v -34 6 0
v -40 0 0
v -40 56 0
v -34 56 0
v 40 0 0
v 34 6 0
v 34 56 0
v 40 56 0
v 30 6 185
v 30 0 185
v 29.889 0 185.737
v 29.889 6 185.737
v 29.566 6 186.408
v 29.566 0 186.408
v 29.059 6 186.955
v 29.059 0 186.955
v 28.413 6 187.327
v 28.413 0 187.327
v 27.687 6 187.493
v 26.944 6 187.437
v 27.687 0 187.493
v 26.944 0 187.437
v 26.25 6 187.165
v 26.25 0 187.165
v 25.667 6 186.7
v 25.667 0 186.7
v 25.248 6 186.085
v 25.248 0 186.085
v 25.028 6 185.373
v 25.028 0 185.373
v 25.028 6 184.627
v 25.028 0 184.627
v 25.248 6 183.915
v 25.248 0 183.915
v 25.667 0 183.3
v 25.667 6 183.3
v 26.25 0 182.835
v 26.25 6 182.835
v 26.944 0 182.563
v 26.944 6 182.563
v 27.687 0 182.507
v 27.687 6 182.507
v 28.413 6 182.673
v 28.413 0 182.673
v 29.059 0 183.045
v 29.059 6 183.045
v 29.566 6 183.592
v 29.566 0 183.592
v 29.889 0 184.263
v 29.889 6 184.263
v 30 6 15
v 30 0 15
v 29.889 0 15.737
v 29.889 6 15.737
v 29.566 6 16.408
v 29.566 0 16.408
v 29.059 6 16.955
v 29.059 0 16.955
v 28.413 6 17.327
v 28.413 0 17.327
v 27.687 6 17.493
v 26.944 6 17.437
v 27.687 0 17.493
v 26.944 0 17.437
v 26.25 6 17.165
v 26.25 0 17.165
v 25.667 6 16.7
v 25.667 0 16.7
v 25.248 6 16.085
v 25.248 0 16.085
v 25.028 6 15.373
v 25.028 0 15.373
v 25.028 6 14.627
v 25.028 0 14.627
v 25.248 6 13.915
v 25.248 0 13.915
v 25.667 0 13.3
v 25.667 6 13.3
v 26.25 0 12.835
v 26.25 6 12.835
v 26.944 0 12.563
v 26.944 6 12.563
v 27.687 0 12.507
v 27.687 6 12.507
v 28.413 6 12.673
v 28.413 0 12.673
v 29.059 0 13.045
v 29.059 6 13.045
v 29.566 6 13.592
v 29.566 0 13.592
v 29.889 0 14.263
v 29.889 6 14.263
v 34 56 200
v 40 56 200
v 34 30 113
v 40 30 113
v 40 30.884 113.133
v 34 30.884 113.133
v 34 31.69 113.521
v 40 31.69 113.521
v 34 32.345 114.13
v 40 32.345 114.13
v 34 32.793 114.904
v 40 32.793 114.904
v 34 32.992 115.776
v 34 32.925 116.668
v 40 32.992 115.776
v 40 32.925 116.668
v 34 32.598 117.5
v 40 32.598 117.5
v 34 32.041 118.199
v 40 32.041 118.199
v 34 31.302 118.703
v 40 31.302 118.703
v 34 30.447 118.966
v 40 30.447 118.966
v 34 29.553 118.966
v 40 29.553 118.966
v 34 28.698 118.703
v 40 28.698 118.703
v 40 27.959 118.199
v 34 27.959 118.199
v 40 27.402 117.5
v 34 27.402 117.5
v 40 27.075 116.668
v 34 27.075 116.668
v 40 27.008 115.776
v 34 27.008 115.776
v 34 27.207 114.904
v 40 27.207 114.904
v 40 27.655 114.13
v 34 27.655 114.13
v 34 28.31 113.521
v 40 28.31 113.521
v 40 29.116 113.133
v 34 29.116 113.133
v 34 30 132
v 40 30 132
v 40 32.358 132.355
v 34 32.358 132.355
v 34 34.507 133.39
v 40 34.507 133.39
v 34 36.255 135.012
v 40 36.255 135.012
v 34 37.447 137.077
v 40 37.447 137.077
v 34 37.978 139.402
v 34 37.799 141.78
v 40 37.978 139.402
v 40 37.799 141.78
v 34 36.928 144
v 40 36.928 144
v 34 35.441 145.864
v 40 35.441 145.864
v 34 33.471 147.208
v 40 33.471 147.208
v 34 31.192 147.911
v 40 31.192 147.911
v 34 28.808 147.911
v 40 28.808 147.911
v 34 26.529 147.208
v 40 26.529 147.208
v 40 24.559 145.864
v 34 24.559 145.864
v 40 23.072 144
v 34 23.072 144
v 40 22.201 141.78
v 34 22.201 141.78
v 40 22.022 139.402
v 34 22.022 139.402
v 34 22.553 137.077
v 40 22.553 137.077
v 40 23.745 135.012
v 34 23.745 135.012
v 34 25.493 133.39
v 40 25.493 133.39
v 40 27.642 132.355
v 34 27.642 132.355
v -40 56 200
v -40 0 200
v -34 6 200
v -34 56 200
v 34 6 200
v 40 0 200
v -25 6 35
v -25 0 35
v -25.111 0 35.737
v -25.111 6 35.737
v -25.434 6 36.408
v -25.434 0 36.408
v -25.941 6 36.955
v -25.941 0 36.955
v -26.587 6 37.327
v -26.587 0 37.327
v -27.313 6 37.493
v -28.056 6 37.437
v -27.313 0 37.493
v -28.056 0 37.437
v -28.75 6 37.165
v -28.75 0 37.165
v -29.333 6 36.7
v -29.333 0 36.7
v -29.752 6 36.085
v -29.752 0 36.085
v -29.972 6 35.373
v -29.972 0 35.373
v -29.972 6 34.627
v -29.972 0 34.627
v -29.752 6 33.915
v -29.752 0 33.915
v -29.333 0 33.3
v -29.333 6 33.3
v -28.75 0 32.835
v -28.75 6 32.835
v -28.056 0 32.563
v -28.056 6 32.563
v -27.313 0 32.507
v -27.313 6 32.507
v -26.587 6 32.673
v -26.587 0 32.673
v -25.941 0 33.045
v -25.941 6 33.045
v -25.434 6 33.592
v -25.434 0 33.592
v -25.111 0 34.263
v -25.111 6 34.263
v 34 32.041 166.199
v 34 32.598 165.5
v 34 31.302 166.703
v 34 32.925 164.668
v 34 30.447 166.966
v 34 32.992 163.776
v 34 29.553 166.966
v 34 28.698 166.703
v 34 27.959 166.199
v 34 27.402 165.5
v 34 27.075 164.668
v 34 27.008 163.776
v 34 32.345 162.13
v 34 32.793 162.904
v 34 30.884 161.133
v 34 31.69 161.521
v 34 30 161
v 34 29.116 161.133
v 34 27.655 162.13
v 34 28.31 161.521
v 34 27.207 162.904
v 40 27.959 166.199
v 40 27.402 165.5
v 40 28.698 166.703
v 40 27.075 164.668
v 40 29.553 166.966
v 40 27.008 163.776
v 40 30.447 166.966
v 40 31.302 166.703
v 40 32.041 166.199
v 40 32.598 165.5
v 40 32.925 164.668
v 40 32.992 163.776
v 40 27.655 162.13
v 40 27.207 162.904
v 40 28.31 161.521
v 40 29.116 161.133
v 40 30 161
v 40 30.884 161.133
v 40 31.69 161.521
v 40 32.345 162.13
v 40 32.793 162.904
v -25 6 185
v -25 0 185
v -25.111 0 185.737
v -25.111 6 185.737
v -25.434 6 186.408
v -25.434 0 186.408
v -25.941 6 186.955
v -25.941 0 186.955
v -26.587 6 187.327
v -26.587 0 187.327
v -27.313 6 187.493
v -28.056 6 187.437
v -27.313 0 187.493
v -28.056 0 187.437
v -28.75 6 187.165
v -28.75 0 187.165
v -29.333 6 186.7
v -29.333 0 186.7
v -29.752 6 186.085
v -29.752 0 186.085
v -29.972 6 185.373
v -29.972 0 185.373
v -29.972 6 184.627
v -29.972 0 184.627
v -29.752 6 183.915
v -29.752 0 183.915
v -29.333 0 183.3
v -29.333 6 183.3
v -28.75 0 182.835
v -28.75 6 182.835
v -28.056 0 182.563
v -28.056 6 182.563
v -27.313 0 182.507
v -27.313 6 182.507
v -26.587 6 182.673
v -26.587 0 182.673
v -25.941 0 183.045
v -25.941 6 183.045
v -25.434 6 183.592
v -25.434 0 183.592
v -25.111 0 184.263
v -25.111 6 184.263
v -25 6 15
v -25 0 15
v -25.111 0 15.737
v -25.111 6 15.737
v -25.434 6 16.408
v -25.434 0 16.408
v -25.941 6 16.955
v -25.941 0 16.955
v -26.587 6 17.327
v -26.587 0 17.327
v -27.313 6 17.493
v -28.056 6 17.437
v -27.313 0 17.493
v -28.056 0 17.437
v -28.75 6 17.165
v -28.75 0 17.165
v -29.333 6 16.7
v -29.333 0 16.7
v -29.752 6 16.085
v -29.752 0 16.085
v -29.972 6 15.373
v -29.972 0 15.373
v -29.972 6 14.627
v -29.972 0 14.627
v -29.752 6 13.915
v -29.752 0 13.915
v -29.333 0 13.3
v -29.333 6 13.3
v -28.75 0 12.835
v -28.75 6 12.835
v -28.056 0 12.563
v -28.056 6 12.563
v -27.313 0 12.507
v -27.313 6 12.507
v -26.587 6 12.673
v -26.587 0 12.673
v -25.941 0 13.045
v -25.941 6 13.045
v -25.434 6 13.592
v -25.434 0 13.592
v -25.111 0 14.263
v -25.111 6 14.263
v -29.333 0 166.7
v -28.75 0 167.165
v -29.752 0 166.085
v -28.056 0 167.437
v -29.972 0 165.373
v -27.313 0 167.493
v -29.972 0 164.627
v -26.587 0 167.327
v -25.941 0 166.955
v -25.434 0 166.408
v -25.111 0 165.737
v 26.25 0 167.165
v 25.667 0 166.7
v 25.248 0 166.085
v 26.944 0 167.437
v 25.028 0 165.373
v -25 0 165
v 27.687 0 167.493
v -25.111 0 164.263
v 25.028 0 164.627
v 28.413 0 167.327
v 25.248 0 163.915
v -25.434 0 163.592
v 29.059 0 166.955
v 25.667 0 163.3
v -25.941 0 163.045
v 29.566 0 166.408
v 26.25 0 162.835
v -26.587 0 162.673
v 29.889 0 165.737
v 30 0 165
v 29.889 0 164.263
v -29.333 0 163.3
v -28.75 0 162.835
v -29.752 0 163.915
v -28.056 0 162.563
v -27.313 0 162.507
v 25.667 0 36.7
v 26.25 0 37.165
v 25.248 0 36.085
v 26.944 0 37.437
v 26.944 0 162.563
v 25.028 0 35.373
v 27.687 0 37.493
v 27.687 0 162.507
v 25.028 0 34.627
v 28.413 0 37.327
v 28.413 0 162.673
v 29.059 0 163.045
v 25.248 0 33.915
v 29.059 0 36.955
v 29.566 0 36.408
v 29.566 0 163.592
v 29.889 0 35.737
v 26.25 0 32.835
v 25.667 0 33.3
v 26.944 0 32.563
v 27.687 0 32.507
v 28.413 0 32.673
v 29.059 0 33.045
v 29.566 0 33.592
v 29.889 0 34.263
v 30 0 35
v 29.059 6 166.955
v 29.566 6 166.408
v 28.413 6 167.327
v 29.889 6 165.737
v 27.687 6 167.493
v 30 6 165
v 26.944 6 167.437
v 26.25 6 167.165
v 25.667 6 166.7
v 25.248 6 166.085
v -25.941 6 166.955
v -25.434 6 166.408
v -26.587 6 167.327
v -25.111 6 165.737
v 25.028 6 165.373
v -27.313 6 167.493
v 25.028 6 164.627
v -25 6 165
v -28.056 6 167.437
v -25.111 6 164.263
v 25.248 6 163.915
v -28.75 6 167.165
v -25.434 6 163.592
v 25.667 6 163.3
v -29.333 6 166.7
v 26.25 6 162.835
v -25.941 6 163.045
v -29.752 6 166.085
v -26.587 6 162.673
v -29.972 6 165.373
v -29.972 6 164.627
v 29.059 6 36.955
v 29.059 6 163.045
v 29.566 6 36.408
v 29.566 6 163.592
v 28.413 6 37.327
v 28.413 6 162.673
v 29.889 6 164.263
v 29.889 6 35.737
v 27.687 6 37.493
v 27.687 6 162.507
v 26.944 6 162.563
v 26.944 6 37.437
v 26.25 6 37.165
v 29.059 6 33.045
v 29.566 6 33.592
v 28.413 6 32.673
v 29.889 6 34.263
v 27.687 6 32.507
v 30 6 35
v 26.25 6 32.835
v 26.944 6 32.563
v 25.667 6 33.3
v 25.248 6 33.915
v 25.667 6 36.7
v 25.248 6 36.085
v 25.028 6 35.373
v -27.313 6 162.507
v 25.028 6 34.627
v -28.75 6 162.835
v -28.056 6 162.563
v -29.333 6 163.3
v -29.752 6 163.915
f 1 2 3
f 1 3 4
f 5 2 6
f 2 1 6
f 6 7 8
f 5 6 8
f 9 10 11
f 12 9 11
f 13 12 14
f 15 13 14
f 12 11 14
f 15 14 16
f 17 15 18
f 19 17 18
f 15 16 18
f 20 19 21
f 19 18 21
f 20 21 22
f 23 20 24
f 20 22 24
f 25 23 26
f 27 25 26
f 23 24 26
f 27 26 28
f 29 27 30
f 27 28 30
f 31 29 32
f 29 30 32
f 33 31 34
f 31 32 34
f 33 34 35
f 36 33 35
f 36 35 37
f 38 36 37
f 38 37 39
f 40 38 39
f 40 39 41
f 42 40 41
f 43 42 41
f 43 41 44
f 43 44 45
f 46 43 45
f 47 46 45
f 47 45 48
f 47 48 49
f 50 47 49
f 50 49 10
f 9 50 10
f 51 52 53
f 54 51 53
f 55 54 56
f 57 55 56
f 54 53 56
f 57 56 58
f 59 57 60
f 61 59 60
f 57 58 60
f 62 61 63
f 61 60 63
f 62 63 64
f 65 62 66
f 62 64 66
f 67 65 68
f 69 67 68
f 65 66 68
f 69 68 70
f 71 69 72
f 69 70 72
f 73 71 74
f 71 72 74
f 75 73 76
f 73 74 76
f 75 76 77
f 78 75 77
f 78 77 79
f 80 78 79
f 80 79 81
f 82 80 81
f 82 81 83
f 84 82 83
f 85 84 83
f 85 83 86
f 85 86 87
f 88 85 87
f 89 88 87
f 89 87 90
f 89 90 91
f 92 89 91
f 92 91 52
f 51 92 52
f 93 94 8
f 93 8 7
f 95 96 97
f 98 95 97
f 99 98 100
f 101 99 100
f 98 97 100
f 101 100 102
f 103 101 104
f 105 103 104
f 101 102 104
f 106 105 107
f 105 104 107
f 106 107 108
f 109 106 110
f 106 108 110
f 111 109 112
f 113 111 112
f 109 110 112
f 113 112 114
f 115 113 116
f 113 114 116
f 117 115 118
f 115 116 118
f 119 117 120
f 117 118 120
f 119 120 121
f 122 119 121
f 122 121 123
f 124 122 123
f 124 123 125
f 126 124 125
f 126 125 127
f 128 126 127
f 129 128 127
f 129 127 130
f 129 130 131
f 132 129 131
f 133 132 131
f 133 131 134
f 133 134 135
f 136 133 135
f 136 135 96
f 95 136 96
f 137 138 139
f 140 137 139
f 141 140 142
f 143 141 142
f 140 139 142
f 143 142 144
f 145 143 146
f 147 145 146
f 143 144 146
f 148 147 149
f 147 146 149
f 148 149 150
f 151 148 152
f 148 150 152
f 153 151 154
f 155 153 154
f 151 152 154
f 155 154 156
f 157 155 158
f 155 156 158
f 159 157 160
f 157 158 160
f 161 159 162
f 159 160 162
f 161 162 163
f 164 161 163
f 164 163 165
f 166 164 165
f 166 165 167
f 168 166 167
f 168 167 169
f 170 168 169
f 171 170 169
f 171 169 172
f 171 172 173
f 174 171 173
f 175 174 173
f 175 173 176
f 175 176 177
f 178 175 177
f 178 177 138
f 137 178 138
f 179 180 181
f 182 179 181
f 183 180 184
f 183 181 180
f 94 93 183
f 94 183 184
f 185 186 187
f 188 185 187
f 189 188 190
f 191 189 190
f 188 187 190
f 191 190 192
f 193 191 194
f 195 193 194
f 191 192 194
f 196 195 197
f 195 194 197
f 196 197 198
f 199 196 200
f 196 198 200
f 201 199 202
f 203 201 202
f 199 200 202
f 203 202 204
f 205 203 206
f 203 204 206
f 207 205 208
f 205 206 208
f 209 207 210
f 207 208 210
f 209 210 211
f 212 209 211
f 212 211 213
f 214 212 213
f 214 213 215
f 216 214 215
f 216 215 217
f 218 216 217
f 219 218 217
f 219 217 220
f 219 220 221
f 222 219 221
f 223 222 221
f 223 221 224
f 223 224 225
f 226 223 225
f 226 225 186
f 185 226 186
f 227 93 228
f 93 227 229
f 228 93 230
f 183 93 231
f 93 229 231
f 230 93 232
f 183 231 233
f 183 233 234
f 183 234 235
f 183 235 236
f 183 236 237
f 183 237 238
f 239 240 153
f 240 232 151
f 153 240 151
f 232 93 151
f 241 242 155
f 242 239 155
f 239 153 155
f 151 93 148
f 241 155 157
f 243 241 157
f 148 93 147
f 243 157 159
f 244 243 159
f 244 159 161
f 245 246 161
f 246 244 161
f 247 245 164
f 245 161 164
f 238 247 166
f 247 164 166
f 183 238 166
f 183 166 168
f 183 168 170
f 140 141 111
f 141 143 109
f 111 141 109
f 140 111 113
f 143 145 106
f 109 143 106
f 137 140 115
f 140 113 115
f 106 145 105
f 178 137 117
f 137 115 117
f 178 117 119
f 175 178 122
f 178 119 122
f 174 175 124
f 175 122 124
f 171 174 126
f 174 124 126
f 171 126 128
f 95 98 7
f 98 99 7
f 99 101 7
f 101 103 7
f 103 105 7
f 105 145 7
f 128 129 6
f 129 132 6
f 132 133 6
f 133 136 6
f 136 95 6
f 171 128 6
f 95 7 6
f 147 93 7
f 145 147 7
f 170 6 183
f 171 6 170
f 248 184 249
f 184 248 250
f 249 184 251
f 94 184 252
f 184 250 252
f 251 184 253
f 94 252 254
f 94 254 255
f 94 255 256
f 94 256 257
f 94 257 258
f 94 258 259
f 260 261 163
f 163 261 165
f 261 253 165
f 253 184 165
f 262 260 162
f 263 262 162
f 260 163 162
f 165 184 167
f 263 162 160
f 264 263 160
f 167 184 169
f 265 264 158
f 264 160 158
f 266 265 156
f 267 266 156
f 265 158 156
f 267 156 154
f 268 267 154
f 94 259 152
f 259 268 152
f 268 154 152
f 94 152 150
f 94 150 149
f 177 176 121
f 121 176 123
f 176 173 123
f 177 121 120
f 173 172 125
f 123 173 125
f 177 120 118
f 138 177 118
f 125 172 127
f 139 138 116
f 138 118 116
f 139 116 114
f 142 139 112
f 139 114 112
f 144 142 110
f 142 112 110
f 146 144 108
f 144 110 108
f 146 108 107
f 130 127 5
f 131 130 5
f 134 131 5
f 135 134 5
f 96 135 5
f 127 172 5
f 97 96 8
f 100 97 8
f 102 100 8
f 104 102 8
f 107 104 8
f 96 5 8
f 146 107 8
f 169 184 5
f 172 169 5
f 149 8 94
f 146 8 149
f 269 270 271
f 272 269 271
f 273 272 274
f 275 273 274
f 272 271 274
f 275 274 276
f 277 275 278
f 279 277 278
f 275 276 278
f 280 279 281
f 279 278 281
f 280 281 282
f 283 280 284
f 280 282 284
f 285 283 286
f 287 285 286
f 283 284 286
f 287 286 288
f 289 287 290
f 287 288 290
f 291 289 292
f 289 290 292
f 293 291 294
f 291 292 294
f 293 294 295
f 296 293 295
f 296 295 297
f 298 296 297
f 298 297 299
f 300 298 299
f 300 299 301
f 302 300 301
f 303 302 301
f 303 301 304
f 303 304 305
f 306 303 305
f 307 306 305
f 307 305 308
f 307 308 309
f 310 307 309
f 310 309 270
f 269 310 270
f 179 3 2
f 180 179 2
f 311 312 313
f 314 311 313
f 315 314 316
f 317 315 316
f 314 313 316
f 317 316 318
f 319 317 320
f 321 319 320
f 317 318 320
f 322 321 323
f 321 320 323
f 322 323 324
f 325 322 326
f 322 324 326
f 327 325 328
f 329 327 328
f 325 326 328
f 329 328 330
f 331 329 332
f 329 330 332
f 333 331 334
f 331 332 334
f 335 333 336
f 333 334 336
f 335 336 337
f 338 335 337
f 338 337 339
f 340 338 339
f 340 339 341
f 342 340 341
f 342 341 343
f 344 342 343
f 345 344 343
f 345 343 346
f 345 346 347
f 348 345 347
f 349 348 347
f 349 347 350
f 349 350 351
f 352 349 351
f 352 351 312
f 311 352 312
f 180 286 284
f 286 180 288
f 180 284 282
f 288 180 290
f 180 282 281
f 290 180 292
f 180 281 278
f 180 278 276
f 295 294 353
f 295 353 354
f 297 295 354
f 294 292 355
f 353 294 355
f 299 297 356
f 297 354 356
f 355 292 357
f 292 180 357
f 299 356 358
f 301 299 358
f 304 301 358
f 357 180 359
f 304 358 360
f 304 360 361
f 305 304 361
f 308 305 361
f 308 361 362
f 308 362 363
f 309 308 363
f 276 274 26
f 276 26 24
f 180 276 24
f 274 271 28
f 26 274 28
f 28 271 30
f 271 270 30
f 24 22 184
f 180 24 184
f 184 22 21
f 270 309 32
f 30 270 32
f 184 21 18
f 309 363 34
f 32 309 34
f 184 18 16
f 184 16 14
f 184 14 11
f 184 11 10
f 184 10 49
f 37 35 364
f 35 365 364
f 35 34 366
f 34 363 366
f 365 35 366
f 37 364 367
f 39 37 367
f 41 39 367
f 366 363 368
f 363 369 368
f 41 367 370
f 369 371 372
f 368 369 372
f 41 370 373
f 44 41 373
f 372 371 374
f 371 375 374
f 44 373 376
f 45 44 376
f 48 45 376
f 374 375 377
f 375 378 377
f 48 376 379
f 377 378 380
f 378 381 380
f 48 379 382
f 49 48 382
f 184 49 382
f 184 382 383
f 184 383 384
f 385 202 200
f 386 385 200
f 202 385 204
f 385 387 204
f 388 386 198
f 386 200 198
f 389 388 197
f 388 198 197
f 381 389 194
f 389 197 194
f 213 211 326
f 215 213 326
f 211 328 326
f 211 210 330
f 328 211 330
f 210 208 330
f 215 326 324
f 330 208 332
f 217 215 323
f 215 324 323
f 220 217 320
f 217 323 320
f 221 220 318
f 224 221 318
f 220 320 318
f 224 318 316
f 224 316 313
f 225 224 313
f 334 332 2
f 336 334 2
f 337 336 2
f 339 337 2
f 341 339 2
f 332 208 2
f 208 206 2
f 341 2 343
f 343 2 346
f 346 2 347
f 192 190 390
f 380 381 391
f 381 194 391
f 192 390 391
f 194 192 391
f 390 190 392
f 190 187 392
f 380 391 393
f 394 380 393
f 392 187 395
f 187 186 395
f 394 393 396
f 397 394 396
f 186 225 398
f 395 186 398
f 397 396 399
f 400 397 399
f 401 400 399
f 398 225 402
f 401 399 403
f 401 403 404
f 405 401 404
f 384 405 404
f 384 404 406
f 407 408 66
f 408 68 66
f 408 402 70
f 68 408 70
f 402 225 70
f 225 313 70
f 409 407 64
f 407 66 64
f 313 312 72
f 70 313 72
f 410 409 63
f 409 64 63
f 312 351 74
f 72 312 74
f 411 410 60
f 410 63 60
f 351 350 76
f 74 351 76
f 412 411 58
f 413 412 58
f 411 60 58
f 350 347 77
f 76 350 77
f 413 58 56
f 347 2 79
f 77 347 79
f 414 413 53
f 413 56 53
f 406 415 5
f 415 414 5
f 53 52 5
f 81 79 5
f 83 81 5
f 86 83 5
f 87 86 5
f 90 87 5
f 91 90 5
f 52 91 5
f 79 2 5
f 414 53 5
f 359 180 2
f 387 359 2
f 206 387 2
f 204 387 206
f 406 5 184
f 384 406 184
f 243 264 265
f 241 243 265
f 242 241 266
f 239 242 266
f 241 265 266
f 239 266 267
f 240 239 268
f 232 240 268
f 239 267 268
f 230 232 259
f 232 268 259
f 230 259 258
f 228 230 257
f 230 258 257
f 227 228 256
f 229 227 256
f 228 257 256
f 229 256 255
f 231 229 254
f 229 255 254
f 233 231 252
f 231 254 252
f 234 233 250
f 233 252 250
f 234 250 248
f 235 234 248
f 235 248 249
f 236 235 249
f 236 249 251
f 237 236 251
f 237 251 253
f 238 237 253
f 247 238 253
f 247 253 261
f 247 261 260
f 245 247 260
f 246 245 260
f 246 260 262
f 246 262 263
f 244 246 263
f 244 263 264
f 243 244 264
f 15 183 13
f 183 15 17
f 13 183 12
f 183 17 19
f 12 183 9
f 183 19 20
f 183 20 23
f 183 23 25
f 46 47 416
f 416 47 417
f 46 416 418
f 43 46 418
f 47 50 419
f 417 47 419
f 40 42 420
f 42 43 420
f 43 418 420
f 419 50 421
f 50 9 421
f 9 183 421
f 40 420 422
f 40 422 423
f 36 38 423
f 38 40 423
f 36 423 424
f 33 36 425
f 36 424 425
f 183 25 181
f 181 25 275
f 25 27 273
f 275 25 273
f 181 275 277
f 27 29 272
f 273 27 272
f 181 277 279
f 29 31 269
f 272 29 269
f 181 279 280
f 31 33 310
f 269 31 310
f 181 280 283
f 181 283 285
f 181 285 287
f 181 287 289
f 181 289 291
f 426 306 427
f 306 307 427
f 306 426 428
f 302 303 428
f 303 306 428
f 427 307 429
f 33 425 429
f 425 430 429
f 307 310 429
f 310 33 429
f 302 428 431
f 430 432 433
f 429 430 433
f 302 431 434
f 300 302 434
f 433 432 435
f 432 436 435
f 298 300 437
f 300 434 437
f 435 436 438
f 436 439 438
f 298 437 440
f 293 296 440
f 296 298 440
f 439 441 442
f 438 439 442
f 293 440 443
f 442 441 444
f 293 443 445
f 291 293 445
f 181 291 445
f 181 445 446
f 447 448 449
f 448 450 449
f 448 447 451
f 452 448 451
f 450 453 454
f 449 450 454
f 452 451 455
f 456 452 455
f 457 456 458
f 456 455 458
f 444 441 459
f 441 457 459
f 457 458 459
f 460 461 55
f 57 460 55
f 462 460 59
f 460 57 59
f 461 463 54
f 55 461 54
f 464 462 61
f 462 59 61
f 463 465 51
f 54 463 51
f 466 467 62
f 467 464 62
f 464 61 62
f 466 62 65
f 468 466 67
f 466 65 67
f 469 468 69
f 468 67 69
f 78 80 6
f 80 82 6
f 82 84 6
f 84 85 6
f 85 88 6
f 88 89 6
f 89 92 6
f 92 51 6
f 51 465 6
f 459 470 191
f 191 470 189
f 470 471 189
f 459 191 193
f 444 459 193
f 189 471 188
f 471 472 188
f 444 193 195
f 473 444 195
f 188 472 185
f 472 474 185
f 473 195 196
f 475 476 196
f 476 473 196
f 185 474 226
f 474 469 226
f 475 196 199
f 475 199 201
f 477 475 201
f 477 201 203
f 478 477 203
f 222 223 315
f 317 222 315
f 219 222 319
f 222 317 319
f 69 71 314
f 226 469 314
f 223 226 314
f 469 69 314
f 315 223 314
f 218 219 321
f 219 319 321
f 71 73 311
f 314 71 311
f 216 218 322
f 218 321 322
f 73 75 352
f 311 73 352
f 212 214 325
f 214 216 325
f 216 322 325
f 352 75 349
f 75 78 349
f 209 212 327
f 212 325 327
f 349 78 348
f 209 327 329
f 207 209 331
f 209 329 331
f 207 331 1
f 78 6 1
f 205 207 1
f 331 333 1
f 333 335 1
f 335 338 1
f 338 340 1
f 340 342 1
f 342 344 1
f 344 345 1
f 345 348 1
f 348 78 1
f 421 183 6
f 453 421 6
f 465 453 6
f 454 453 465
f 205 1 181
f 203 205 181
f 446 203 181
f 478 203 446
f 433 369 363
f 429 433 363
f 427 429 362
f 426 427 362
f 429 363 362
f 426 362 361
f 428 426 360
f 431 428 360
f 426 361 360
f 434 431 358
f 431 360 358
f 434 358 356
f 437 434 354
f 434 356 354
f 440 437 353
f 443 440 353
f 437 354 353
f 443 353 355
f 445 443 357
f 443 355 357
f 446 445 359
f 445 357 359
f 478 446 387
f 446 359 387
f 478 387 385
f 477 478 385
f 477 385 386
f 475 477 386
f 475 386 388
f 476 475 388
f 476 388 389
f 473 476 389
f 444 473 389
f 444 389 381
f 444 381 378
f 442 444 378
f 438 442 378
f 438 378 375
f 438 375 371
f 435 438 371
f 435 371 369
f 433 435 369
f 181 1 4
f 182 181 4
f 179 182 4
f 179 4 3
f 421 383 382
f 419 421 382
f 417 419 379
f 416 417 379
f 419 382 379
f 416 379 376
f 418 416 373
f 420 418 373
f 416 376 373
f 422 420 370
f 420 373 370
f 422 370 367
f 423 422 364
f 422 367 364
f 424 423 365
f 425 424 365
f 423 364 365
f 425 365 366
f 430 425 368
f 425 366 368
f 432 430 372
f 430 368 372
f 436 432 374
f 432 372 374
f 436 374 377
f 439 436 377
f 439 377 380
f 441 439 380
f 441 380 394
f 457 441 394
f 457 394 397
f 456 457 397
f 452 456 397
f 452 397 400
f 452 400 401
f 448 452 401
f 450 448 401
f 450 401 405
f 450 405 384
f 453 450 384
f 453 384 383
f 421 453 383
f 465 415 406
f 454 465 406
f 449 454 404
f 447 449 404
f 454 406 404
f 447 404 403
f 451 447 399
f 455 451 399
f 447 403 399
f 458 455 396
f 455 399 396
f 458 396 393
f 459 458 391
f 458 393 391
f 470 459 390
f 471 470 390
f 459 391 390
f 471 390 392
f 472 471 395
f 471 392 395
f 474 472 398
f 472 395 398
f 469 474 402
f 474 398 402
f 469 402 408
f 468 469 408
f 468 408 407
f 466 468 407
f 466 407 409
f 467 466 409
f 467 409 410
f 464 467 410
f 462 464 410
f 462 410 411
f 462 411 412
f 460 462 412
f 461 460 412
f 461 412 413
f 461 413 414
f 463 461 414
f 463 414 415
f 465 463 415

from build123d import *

# Parameters (mm, degrees)
EXTRUDE_1_DEPTH     = 200
CUT_EXTRUDE_1_REACH = 82
SKETCH_3_R          = 8
SKETCH_3_R_2        = 3
CUT_EXTRUDE_2_REACH = 58
SKETCH_4_R          = 2.5


with BuildPart() as part:
    # 草图1 → 凸台-拉伸1 (new body)
    with BuildSketch(Plane.XY):
        Polygon((-40, 0), (40, 0), (40, 56), (34, 56), (34, 6), (-34, 6), (-34, 56), (-40, 56), align=None)
    extrude(amount=EXTRUDE_1_DEPTH)

    # 草图3 → 切除-拉伸1 (cut, up to next)
    with BuildSketch(Plane(origin=(40, 0, 0), x_dir=(0, 0, -1), z_dir=(1, 0, 0)), mode=Mode.PRIVATE) as cut_extrude_1_sk1:
        with Locations((-140, 30)):
            Circle(SKETCH_3_R)
    cut_extrude_1_tool1 = extrude(cut_extrude_1_sk1.sketch, amount=-CUT_EXTRUDE_1_REACH, mode=Mode.PRIVATE) & part.part
    add(cut_extrude_1_tool1.solids().sort_by_distance((40, 30, 140))[0], mode=Mode.SUBTRACT)
    # 草图3 → 切除-拉伸1 (cut, up to next)
    with BuildSketch(Plane(origin=(40, 0, 0), x_dir=(0, 0, -1), z_dir=(1, 0, 0)), mode=Mode.PRIVATE) as cut_extrude_1_sk2:
        with Locations((-164, 30)):
            Circle(SKETCH_3_R_2)
    cut_extrude_1_tool2 = extrude(cut_extrude_1_sk2.sketch, amount=-CUT_EXTRUDE_1_REACH, mode=Mode.PRIVATE) & part.part
    add(cut_extrude_1_tool2.solids().sort_by_distance((40, 30, 164))[0], mode=Mode.SUBTRACT)
    # 草图3 → 切除-拉伸1 (cut, up to next)
    with BuildSketch(Plane(origin=(40, 0, 0), x_dir=(0, 0, -1), z_dir=(1, 0, 0)), mode=Mode.PRIVATE) as cut_extrude_1_sk3:
        with Locations((-116, 30)):
            Circle(SKETCH_3_R_2)
    cut_extrude_1_tool3 = extrude(cut_extrude_1_sk3.sketch, amount=-CUT_EXTRUDE_1_REACH, mode=Mode.PRIVATE) & part.part
    add(cut_extrude_1_tool3.solids().sort_by_distance((40, 30, 116))[0], mode=Mode.SUBTRACT)

    # 草图4 → 切除-拉伸2 (cut, up to next)
    with BuildSketch(Plane.XZ, mode=Mode.PRIVATE) as cut_extrude_2_sk1:
        with Locations((-27.5, 185)):
            Circle(SKETCH_4_R)
    cut_extrude_2_tool1 = extrude(cut_extrude_2_sk1.sketch, amount=-CUT_EXTRUDE_2_REACH, mode=Mode.PRIVATE) & part.part
    add(cut_extrude_2_tool1.solids().sort_by_distance((-27.5, 0, 185))[0], mode=Mode.SUBTRACT)
    # 草图4 → 切除-拉伸2 (cut, up to next)
    with BuildSketch(Plane.XZ, mode=Mode.PRIVATE) as cut_extrude_2_sk2:
        with Locations((27.5, 185)):
            Circle(SKETCH_4_R)
    cut_extrude_2_tool2 = extrude(cut_extrude_2_sk2.sketch, amount=-CUT_EXTRUDE_2_REACH, mode=Mode.PRIVATE) & part.part
    add(cut_extrude_2_tool2.solids().sort_by_distance((27.5, 0, 185))[0], mode=Mode.SUBTRACT)
    # 草图4 → 切除-拉伸2 (cut, up to next)
    with BuildSketch(Plane.XZ, mode=Mode.PRIVATE) as cut_extrude_2_sk3:
        with Locations((-27.5, 165)):
            Circle(SKETCH_4_R)
    cut_extrude_2_tool3 = extrude(cut_extrude_2_sk3.sketch, amount=-CUT_EXTRUDE_2_REACH, mode=Mode.PRIVATE) & part.part
    add(cut_extrude_2_tool3.solids().sort_by_distance((-27.5, 0, 165))[0], mode=Mode.SUBTRACT)
    # 草图4 → 切除-拉伸2 (cut, up to next)
    with BuildSketch(Plane.XZ, mode=Mode.PRIVATE) as cut_extrude_2_sk4:
        with Locations((27.5, 165)):
            Circle(SKETCH_4_R)
    cut_extrude_2_tool4 = extrude(cut_extrude_2_sk4.sketch, amount=-CUT_EXTRUDE_2_REACH, mode=Mode.PRIVATE) & part.part
    add(cut_extrude_2_tool4.solids().sort_by_distance((27.5, 0, 165))[0], mode=Mode.SUBTRACT)
    # 草图4 → 切除-拉伸2 (cut, up to next)
    with BuildSketch(Plane.XZ, mode=Mode.PRIVATE) as cut_extrude_2_sk5:
        with Locations((27.5, 35)):
            Circle(SKETCH_4_R)
    cut_extrude_2_tool5 = extrude(cut_extrude_2_sk5.sketch, amount=-CUT_EXTRUDE_2_REACH, mode=Mode.PRIVATE) & part.part
    add(cut_extrude_2_tool5.solids().sort_by_distance((27.5, 0, 35))[0], mode=Mode.SUBTRACT)
    # 草图4 → 切除-拉伸2 (cut, up to next)
    with BuildSketch(Plane.XZ, mode=Mode.PRIVATE) as cut_extrude_2_sk6:
        with Locations((-27.5, 35)):
            Circle(SKETCH_4_R)
    cut_extrude_2_tool6 = extrude(cut_extrude_2_sk6.sketch, amount=-CUT_EXTRUDE_2_REACH, mode=Mode.PRIVATE) & part.part
    add(cut_extrude_2_tool6.solids().sort_by_distance((-27.5, 0, 35))[0], mode=Mode.SUBTRACT)
    # 草图4 → 切除-拉伸2 (cut, up to next)
    with BuildSketch(Plane.XZ, mode=Mode.PRIVATE) as cut_extrude_2_sk7:
        with Locations((27.5, 15)):
            Circle(SKETCH_4_R)
    cut_extrude_2_tool7 = extrude(cut_extrude_2_sk7.sketch, amount=-CUT_EXTRUDE_2_REACH, mode=Mode.PRIVATE) & part.part
    add(cut_extrude_2_tool7.solids().sort_by_distance((27.5, 0, 15))[0], mode=Mode.SUBTRACT)
    # 草图4 → 切除-拉伸2 (cut, up to next)
    with BuildSketch(Plane.XZ, mode=Mode.PRIVATE) as cut_extrude_2_sk8:
        with Locations((-27.5, 15)):
            Circle(SKETCH_4_R)
    cut_extrude_2_tool8 = extrude(cut_extrude_2_sk8.sketch, amount=-CUT_EXTRUDE_2_REACH, mode=Mode.PRIVATE) & part.part
    add(cut_extrude_2_tool8.solids().sort_by_distance((-27.5, 0, 15))[0], mode=Mode.SUBTRACT)


solid = part.part
